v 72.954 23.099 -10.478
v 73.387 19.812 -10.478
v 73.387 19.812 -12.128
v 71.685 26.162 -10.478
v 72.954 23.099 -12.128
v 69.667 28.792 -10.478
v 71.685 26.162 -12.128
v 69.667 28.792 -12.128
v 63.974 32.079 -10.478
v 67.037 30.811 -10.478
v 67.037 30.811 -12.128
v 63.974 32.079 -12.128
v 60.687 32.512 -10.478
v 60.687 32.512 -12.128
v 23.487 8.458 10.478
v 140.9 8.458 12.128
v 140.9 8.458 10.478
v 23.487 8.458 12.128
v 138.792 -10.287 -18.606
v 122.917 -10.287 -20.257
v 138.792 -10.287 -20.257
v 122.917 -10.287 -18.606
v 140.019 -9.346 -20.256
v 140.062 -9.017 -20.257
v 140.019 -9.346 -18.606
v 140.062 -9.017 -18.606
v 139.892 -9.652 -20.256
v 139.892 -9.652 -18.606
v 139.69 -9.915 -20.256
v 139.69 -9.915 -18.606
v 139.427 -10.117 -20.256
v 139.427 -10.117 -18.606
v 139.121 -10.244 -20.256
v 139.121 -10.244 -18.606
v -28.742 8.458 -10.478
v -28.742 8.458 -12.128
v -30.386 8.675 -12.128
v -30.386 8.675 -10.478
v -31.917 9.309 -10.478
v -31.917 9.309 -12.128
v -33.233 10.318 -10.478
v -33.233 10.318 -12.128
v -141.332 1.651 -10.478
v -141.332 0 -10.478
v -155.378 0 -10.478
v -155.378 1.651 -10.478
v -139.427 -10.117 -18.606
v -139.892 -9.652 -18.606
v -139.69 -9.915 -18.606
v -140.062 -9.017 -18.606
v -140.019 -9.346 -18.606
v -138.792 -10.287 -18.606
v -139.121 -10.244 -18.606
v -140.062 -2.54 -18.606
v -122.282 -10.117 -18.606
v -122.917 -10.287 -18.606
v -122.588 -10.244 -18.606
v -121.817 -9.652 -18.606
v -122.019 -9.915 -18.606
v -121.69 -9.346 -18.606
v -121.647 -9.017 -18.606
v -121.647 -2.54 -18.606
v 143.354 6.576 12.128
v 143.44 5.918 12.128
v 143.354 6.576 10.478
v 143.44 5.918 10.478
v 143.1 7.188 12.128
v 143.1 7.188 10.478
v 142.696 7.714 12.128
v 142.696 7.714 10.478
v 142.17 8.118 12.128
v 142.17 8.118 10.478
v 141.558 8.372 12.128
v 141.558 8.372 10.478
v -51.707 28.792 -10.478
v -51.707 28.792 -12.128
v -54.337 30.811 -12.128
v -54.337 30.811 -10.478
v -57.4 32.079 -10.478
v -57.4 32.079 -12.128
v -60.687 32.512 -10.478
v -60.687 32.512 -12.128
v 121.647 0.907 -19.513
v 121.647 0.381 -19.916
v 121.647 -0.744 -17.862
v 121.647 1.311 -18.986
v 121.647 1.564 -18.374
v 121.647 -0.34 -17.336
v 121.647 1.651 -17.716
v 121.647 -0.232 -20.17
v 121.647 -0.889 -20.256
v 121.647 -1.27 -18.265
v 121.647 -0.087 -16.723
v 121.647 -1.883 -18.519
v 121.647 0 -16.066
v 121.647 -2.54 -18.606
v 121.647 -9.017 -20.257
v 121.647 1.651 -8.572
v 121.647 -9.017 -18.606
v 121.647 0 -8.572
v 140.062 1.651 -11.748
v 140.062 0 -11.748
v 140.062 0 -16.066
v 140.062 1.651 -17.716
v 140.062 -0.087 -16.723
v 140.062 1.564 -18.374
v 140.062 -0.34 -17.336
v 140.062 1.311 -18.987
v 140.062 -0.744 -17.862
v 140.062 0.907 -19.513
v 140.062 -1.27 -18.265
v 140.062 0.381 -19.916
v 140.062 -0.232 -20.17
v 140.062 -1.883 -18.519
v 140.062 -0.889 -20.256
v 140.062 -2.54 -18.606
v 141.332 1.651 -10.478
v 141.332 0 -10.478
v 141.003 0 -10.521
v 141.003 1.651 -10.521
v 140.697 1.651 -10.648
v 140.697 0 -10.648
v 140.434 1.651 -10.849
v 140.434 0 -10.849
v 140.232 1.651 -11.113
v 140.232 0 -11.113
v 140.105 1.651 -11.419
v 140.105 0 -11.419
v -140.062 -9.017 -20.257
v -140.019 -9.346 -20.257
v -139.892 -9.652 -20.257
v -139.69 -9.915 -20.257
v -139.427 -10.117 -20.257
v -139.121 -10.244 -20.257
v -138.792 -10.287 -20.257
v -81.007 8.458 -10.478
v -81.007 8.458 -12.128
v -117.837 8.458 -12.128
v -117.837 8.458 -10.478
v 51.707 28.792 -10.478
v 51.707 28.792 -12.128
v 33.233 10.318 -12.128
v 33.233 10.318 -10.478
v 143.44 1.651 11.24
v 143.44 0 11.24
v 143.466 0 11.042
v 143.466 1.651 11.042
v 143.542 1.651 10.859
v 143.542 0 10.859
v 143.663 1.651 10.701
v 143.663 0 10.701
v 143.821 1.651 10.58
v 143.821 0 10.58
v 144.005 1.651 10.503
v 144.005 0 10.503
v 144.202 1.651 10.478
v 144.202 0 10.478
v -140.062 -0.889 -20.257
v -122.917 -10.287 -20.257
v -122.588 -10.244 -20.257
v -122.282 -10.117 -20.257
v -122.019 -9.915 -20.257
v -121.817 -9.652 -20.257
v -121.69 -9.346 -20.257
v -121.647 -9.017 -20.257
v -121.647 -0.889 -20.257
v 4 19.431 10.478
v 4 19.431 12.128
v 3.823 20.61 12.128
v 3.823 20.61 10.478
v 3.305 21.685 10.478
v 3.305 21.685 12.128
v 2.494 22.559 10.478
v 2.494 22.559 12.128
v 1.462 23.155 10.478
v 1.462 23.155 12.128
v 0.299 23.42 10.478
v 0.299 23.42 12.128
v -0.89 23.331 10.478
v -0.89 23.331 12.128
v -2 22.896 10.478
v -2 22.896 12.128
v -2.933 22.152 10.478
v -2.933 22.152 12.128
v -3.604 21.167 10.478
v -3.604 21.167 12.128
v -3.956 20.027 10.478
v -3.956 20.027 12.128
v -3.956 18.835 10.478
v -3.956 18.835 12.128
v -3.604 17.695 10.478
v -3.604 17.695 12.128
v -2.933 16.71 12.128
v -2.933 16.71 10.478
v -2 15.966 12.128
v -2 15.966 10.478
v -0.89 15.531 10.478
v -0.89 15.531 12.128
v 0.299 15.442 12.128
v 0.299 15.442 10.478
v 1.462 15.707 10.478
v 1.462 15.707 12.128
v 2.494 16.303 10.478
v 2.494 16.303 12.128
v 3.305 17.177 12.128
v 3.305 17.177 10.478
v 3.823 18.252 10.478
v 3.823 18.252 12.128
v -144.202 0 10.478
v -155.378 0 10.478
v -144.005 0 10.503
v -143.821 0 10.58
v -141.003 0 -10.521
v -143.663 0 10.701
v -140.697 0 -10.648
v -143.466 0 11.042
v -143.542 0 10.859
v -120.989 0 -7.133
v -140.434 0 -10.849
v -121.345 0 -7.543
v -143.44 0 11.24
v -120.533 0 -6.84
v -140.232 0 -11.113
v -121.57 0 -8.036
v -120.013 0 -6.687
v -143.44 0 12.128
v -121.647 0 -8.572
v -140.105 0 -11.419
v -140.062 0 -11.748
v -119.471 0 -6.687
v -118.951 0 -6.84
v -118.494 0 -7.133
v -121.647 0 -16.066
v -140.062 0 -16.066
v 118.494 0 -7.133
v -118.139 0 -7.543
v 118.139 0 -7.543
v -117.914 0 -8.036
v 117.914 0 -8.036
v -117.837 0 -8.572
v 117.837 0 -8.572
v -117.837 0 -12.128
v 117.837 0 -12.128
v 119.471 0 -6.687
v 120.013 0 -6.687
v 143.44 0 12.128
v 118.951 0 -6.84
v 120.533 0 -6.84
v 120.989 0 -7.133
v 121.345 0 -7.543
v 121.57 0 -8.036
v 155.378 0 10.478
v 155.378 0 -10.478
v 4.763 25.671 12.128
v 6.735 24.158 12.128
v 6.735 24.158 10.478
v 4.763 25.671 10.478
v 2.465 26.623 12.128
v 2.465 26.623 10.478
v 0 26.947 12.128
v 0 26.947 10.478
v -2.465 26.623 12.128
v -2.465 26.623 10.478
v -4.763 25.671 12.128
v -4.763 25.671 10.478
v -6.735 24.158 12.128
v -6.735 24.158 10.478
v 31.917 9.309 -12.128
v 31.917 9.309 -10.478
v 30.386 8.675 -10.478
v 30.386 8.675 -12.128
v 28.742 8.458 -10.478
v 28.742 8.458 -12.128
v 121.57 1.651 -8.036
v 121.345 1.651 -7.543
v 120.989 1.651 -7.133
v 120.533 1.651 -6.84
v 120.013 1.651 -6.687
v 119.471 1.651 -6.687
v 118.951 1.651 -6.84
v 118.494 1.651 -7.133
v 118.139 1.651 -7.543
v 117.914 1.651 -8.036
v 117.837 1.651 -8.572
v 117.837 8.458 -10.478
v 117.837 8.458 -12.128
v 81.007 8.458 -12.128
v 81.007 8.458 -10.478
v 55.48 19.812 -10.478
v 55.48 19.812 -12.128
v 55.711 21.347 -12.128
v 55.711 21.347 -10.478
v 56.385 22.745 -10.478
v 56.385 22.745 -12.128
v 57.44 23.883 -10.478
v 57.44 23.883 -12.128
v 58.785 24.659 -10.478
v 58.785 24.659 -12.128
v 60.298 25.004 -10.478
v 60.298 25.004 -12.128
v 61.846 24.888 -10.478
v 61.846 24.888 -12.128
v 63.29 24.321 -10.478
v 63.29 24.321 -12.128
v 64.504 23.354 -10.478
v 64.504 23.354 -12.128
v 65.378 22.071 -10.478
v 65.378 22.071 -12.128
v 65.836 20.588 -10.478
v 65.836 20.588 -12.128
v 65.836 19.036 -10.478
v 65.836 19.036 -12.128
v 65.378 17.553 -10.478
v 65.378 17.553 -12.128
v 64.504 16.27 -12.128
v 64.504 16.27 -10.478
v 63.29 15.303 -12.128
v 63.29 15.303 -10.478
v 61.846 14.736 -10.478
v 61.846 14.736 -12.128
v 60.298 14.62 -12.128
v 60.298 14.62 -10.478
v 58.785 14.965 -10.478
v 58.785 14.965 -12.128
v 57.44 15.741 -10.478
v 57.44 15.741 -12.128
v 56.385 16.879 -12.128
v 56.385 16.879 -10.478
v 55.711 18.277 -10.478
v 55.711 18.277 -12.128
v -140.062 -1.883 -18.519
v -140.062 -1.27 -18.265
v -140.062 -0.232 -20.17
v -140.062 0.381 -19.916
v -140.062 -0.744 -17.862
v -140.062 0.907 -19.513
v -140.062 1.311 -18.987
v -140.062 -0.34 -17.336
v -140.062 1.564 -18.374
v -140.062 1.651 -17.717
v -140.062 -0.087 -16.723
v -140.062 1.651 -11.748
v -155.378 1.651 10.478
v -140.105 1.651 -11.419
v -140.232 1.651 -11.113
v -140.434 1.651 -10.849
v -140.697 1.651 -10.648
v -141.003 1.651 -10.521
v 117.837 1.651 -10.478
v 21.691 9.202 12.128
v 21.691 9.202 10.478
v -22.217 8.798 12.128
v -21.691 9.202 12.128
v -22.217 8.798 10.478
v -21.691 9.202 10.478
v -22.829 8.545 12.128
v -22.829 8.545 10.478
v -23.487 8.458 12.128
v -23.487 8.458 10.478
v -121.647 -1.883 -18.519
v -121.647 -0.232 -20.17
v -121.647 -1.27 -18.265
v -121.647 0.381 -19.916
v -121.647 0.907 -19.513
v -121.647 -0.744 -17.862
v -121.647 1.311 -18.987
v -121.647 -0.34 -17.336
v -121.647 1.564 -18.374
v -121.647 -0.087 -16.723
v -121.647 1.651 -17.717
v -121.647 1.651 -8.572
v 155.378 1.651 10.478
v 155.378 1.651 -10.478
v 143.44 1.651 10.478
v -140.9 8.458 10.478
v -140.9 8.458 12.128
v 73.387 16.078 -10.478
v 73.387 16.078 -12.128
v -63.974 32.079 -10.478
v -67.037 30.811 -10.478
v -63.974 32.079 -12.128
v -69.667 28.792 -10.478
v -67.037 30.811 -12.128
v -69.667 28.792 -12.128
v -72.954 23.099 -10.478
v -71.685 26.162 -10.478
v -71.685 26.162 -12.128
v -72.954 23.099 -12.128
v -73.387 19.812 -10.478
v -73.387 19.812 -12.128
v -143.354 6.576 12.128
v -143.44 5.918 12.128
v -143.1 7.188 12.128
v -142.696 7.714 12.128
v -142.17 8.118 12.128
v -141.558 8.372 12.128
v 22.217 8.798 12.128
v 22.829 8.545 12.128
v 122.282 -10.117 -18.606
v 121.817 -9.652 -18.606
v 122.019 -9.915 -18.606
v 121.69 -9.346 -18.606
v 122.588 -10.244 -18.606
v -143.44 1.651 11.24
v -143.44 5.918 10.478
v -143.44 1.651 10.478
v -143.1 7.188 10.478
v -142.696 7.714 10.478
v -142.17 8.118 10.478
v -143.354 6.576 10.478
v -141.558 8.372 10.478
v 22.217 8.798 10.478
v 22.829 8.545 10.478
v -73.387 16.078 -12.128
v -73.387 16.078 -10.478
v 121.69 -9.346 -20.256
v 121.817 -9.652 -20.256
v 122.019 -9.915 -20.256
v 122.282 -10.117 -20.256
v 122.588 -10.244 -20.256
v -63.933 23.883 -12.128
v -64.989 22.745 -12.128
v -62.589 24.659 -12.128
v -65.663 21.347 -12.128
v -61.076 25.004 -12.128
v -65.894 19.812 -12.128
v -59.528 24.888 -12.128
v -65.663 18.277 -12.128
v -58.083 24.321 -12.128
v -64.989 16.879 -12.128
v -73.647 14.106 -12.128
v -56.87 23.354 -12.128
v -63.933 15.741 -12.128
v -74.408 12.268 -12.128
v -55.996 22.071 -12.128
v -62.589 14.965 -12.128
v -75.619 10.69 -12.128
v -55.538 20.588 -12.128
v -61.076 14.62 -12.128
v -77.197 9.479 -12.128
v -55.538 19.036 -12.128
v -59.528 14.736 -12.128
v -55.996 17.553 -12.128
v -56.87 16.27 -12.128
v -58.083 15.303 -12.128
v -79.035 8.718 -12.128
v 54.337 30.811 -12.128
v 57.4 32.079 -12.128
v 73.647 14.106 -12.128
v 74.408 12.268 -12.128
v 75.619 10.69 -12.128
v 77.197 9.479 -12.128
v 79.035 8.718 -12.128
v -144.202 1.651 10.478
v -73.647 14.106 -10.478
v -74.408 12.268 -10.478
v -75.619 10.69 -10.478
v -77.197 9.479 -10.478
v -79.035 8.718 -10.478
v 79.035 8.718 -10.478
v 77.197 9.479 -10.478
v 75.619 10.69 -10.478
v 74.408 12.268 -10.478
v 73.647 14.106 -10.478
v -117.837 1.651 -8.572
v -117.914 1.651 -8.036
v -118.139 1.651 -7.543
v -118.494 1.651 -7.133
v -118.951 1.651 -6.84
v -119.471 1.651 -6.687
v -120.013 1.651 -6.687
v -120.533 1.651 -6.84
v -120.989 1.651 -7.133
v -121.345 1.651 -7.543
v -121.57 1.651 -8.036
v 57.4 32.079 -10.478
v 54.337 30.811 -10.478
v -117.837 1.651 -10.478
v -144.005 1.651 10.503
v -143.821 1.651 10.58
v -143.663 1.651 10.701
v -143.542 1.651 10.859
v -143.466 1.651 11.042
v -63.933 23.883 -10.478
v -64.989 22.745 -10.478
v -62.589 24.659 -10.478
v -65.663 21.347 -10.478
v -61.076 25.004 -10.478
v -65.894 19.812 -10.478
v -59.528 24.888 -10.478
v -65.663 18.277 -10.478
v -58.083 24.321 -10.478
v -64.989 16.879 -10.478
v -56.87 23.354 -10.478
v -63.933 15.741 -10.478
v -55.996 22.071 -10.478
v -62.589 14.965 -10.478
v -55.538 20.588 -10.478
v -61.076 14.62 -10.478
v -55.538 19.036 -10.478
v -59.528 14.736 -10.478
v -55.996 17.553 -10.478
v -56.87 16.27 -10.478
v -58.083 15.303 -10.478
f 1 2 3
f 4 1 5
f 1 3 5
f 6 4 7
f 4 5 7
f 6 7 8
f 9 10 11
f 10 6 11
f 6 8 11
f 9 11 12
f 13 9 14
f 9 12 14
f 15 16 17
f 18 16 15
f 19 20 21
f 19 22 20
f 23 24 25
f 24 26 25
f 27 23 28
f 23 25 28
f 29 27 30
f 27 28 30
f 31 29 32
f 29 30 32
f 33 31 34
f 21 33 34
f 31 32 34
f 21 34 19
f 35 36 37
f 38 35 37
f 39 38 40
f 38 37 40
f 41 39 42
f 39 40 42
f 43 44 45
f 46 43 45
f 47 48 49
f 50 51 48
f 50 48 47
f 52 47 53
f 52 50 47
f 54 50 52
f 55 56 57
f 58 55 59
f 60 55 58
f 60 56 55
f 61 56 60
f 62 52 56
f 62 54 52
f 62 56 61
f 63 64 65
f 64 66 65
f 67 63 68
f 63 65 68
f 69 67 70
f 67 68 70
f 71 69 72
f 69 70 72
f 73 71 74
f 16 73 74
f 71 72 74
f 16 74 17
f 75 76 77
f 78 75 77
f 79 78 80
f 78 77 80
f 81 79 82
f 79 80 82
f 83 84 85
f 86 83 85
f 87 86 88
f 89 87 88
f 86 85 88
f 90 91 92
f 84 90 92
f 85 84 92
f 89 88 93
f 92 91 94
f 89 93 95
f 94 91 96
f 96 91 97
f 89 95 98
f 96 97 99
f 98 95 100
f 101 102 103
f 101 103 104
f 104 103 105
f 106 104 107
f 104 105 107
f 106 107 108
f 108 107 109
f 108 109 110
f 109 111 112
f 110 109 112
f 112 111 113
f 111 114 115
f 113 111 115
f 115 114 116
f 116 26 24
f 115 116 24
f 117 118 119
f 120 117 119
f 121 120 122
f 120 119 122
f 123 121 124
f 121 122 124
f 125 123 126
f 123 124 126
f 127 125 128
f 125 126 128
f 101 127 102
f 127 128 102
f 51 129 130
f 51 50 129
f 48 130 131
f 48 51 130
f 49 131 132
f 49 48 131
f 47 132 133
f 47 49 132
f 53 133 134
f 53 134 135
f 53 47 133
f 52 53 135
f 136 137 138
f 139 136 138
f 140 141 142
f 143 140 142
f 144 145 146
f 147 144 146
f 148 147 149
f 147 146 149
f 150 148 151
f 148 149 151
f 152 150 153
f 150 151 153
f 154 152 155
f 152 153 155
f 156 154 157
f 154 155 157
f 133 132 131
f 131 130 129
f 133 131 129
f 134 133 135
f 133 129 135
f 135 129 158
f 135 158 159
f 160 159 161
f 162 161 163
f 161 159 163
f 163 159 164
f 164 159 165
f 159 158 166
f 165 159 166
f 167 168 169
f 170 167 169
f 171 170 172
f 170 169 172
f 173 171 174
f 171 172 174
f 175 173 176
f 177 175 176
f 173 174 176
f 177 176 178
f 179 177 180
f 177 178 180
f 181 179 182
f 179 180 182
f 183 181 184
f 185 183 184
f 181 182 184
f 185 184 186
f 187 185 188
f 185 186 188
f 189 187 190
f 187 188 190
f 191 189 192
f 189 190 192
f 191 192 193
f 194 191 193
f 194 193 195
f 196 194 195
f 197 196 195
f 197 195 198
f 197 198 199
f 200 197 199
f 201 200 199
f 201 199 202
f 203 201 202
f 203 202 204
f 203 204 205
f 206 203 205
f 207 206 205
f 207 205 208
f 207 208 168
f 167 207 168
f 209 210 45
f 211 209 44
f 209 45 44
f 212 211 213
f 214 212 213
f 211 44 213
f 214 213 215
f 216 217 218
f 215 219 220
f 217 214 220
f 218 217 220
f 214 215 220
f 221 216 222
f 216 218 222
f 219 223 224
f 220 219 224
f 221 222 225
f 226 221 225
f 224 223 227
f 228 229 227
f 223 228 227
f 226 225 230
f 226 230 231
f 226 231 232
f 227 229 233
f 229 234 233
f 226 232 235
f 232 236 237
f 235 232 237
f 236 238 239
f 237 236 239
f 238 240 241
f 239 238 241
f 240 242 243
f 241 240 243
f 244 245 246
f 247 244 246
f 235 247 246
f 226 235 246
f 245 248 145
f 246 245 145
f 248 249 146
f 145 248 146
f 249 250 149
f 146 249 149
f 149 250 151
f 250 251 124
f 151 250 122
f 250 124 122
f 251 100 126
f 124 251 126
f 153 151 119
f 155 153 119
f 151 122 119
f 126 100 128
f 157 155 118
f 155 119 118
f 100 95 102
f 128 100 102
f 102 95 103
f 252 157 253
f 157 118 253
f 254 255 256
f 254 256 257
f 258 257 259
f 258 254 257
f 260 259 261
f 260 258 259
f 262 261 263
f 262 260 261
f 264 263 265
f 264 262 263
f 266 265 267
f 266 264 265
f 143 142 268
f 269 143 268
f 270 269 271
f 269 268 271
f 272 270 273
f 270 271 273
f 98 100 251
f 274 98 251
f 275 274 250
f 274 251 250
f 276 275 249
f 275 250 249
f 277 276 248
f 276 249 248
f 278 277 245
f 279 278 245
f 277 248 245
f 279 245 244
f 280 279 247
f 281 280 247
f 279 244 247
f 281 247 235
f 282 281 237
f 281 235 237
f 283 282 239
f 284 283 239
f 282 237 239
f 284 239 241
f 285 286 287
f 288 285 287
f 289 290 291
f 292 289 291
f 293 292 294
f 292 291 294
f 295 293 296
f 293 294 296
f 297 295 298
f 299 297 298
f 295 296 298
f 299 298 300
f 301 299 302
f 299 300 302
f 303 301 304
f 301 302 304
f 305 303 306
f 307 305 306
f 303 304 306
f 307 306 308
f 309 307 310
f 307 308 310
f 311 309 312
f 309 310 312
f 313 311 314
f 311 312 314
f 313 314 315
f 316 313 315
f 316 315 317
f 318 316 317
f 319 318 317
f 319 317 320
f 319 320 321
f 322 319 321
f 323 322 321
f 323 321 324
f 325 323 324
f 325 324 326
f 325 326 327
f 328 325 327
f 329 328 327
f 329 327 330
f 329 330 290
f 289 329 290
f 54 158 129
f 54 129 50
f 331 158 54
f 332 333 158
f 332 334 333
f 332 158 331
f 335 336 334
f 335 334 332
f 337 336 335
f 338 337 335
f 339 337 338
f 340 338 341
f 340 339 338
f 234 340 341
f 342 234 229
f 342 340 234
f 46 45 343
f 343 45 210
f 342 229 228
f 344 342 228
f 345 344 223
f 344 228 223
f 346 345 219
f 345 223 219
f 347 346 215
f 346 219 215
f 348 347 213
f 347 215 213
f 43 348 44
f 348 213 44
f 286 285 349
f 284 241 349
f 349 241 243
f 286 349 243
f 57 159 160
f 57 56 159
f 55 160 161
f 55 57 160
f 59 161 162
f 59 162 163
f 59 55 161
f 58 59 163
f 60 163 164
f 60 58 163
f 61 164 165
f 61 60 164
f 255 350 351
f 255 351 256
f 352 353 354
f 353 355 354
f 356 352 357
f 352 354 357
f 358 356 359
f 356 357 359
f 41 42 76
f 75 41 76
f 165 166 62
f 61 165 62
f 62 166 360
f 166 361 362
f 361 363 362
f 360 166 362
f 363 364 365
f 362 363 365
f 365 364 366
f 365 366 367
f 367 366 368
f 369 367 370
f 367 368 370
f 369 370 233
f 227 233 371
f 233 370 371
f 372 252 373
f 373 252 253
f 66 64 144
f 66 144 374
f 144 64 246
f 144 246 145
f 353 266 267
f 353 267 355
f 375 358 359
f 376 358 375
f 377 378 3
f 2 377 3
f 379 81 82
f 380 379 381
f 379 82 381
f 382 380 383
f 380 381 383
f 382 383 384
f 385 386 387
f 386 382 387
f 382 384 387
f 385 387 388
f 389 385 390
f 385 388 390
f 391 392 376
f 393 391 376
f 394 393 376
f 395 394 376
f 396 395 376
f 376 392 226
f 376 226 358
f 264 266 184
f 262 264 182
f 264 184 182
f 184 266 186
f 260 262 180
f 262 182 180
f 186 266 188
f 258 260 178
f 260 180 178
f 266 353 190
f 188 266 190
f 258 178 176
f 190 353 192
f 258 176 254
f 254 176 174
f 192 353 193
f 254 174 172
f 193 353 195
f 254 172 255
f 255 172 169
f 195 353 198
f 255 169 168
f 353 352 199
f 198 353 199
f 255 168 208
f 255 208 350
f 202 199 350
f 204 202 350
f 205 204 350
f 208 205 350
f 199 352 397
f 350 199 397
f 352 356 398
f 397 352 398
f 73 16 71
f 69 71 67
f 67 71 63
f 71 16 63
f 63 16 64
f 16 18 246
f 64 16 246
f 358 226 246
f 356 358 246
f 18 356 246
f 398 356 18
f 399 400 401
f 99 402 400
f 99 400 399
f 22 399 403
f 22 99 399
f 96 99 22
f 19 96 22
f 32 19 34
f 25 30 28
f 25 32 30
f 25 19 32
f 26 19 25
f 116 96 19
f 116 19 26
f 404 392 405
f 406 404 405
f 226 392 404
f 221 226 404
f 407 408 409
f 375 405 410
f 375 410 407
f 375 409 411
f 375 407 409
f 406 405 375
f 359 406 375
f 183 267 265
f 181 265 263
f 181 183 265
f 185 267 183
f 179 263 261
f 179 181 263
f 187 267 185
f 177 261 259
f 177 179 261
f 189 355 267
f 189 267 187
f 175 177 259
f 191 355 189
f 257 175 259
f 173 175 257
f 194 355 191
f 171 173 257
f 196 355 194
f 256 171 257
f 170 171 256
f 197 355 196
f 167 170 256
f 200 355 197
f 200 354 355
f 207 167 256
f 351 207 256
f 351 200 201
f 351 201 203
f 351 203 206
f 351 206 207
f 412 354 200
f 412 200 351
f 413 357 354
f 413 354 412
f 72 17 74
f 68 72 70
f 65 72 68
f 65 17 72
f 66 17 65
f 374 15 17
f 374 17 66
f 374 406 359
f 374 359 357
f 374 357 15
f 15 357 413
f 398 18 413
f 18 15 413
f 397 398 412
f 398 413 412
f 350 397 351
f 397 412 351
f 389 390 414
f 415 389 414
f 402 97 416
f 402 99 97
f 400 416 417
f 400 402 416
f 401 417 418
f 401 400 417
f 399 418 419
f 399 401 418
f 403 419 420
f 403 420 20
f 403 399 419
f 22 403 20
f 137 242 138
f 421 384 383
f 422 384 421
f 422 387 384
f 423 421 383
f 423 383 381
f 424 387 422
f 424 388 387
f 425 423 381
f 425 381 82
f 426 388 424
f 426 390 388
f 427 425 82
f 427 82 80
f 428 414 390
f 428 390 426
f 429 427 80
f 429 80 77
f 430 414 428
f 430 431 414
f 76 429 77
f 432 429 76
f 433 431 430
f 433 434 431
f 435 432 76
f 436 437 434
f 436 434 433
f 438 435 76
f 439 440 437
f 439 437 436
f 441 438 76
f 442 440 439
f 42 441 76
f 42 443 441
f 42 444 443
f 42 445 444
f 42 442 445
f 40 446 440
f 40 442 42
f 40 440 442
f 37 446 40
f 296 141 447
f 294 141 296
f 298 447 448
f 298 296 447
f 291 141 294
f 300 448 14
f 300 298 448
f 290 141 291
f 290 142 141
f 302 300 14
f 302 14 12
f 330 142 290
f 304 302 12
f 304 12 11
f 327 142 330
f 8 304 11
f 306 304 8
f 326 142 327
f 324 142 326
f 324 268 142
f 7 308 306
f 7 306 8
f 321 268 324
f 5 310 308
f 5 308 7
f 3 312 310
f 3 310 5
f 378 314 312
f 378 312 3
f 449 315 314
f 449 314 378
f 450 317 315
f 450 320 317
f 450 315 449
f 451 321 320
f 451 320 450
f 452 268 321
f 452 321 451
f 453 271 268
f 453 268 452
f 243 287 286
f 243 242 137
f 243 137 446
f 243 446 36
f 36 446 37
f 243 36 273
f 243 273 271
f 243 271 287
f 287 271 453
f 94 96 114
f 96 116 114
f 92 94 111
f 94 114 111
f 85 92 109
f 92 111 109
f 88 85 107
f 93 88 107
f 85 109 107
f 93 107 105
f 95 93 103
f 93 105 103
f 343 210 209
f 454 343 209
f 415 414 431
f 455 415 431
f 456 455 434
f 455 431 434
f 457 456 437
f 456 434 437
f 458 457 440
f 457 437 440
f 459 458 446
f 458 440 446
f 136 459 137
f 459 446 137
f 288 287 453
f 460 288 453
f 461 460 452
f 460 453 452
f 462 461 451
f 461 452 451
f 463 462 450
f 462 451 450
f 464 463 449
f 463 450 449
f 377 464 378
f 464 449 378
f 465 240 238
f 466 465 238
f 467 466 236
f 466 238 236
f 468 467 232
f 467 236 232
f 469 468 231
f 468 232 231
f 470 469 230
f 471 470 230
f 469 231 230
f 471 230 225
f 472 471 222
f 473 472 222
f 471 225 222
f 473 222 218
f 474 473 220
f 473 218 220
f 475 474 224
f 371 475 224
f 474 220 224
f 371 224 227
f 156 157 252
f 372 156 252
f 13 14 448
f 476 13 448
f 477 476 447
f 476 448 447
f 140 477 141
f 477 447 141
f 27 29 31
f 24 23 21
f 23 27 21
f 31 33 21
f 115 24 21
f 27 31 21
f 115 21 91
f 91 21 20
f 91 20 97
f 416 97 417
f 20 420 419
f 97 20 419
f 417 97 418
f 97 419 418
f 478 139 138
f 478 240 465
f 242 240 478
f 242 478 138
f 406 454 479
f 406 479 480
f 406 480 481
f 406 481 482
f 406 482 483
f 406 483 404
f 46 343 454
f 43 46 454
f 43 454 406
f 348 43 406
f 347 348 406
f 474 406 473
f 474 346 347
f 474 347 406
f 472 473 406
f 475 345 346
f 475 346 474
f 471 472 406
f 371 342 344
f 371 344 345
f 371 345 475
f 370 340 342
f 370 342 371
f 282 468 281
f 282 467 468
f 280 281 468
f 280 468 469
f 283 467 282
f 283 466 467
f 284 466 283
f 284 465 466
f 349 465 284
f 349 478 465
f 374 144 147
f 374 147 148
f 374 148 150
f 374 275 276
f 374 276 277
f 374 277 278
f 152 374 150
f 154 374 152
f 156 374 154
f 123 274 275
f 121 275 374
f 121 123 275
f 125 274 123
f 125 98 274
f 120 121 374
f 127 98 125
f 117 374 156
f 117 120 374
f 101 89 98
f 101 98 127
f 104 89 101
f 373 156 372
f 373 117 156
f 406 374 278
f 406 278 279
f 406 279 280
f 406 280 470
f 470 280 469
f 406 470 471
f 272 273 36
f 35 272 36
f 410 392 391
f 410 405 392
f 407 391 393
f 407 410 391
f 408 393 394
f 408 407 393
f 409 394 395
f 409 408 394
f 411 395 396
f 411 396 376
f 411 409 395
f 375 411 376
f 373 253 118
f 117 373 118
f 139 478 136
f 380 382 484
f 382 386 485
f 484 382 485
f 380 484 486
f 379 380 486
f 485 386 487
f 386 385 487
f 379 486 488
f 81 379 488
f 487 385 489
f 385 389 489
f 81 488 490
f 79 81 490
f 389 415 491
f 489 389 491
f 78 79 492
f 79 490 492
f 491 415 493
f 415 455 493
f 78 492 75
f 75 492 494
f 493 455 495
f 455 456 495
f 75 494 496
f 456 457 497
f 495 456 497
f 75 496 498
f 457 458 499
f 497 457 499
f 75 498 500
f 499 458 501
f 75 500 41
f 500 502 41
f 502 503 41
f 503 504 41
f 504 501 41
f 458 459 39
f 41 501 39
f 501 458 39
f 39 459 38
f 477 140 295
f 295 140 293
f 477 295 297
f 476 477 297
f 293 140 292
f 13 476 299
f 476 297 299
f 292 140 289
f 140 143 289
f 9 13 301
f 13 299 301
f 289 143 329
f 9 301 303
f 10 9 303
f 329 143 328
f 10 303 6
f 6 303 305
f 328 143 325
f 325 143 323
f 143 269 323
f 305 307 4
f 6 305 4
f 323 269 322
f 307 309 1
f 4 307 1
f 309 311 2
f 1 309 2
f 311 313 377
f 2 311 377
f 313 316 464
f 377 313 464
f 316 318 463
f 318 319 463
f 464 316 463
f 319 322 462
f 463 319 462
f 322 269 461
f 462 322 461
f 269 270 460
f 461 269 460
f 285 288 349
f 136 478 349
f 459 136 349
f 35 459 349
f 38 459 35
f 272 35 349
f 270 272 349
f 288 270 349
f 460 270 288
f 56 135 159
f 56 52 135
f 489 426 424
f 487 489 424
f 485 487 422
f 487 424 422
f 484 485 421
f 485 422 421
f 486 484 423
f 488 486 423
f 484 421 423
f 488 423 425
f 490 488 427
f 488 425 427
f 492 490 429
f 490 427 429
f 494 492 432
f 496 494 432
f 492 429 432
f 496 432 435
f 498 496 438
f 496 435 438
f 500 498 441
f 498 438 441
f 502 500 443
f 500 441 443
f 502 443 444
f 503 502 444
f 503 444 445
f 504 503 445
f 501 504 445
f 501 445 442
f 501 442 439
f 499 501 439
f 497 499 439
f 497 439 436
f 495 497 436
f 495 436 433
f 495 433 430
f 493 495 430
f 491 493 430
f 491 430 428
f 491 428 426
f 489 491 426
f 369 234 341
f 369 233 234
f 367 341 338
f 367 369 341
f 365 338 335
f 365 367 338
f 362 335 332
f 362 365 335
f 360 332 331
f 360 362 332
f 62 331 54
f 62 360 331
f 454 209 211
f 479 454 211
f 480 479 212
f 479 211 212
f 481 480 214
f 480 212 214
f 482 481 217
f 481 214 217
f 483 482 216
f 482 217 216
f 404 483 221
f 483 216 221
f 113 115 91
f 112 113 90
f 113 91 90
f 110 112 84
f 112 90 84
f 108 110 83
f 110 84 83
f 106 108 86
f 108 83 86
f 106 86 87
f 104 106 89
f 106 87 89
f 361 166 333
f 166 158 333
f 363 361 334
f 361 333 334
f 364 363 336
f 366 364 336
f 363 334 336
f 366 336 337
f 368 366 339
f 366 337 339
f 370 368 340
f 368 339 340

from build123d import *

# Parameters (mm, degrees)
BOSS_EXTRUDE1_DEPTH = 1.651
SKETCH2_W           = 18.415
SKETCH2_H           = 1.651
BOSS_EXTRUDE2_DEPTH = 10.287
FILLET1_R           = 2.54
FILLET3_R           = 1.27
SKETCH4_W           = 235.6739
SKETCH4_H           = 1.651
SKETCH4_W_2         = 286.8803
BOSS_EXTRUDE3_DEPTH = 30.861
SKETCH5_R           = 4.0005
CUT_EXTRUDE2_DEPTH  = 2.54
FILLET4_R           = 2.54
SKETCH11_R          = 5.207
CUT_EXTRUDE3_DEPTH  = 7.62


with BuildPart() as part:
    # Sketch1 → Boss-Extrude1 (new body)
    with BuildSketch(Plane(origin=(0, 0, 0), x_dir=(1, 0, 0), z_dir=(0, 1, 0))):
        with BuildLine():
            Line((117.83695, 8.5725), (117.83695, 12.1285))
            Line((117.83695, 12.1285), (117.186124302, 12.1285))
            Line((117.186124302, 12.1285), (-117.186124302, 12.1285))
            Line((-117.186124302, 12.1285), (-117.83695, 12.1285))
            Line((-117.83695, 12.1285), (-117.83695, 8.5725))
            ThreePointArc((-117.83695, 8.5725), (-119.74195, 6.6675), (-121.64695, 8.5725))
            Line((-121.64695, 8.5725), (-121.64695, 12.1285))
            Line((-121.64695, 12.1285), (-121.64695, 20.2565))
            Line((-121.64695, 20.2565), (-140.06195, 20.2565))
            Line((-140.06195, 20.2565), (-140.06195, 12.1285))
            Line((-140.06195, 12.1285), (-140.06195, 11.7475))
            ThreePointArc((-140.06195, 11.7475), (-140.433924388, 10.849474388), (-141.33195, 10.4775))
            Line((-141.33195, 10.4775), (-143.44015, 10.4775))
            Line((-143.44015, 10.4775), (-155.37815, 10.4775))
            Line((-155.37815, 10.4775), (-155.37815, -10.4775))
            Line((-155.37815, -10.4775), (-144.20215, -10.4775))
            ThreePointArc((-144.20215, -10.4775), (-143.663334633, -10.700684633), (-143.44015, -11.2395))
            Line((-143.44015, -11.2395), (-143.44015, -12.1285))
            Line((-143.44015, -12.1285), (143.44015, -12.1285))
            Line((143.44015, -12.1285), (143.44015, -11.2395))
            ThreePointArc((143.44015, -11.2395), (143.663334633, -10.700684633), (144.20215, -10.4775))
            Line((144.20215, -10.4775), (155.37815, -10.4775))
            Line((155.37815, -10.4775), (155.37815, 10.4775))
            Line((155.37815, 10.4775), (143.44015, 10.4775))
            Line((143.44015, 10.4775), (141.33195, 10.4775))
            ThreePointArc((141.33195, 10.4775), (140.433924388, 10.849474388), (140.06195, 11.7475))
            Line((140.06195, 11.7475), (140.06195, 12.1285))
            Line((140.06195, 12.1285), (140.06195, 20.2565))
            Line((140.06195, 20.2565), (121.64695, 20.2565))
            Line((121.64695, 20.2565), (121.64695, 12.1285))
            Line((121.64695, 12.1285), (121.64695, 8.5725))
            ThreePointArc((121.64695, 8.5725), (119.74195, 6.6675), (117.83695, 8.5725))
        make_face()
    extrude(amount=BOSS_EXTRUDE1_DEPTH)

    # Sketch2 → Boss-Extrude2 (add)
    with BuildSketch(Plane.XZ):
        with Locations((-130.85445, -19.431)):
            Rectangle(SKETCH2_W, SKETCH2_H)
        with Locations((130.85445, -19.431)):
            Rectangle(SKETCH2_W, SKETCH2_H)
    extrude(amount=BOSS_EXTRUDE2_DEPTH)

    # Fillet1
    fillet1_edges = [part.edges().sort_by_distance(p)[0] for p in [
        (130.85445, 1.651, -20.2565),
        (-130.85445, 1.651, -20.2565),
        (-130.85445, 0, -18.6055),
        (130.85445, 0, -18.6055),
    ]]
    fillet(fillet1_edges, radius=FILLET1_R)

    # Fillet3
    fillet3_edges = [part.edges().sort_by_distance(p)[0] for p in [
        (-140.06195, -10.287, -19.431),
        (-121.64695, -10.287, -19.431),
        (140.06195, -10.287, -19.431),
        (121.64695, -10.287, -19.431),
    ]]
    fillet(fillet3_edges, radius=FILLET3_R)

    # Sketch4 → Boss-Extrude3 (add)
    with BuildSketch(Plane(origin=(0, 1.651, 0), x_dir=(1, 0, 0), z_dir=(0, 1, 0))):
        with Locations((0, 11.303)):
            Rectangle(SKETCH4_W, SKETCH4_H)
        with Locations((0, -11.303)):
            Rectangle(SKETCH4_W_2, SKETCH4_H)
    extrude(amount=BOSS_EXTRUDE3_DEPTH)

    # Sketch5 → Cut-Extrude2 (cut)
    with BuildSketch(Plane.XY.offset(12.1285)):
        with Locations((0, 19.431)):
            Circle(SKETCH5_R)
        with BuildLine():
            Line((143.44015, 8.4582), (22.43455, 8.4582))
            Line((22.43455, 8.4582), (6.735192091, 24.157557909))
            ThreePointArc((6.735192091, 24.157557909), (0, 26.947365818), (-6.735192091, 24.157557909))
            Line((-6.735192091, 24.157557909), (-22.43455, 8.4582))
            Line((-22.43455, 8.4582), (-143.44015, 8.4582))
            Line((-143.44015, 8.4582), (-143.44015, 32.512))
            Line((-143.44015, 32.512), (143.44015, 32.512))
            Line((143.44015, 32.512), (143.44015, 8.4582))
        make_face()
    extrude(amount=-CUT_EXTRUDE2_DEPTH, mode=Mode.SUBTRACT)

    # Fillet4
    fillet4_edges = [part.edges().sort_by_distance(p)[0] for p in [
        (143.44015, 8.4582, 11.303),
        (22.43455, 8.4582, 11.303),
        (-22.43455, 8.4582, 11.303),
        (-143.44015, 8.4582, 11.303),
    ]]
    fillet(fillet4_edges, radius=FILLET4_R)

    # Sketch11 → Cut-Extrude3 (cut)
    with BuildSketch(Plane(origin=(0, 0, -12.1285), x_dir=(-1, 0, 0), z_dir=(0, 0, -1))):
        with Locations((60.68695, 19.812)):
            Circle(SKETCH11_R)
        with Locations((-60.68695, 19.812)):
            Circle(SKETCH11_R)
        with BuildLine():
            Line((81.00695, 8.4582), (117.83695, 8.4582))
            Line((117.83695, 8.4582), (117.83695, 32.512))
            Line((117.83695, 32.512), (60.68695, 32.512))
            ThreePointArc((60.68695, 32.512), (69.667206121, 28.792256121), (73.38695, 19.812))
            Line((73.38695, 19.812), (73.38695, 16.0782))
            ThreePointArc((73.38695, 16.0782), (75.618796327, 10.690046327), (81.00695, 8.4582))
        make_face()
        with BuildLine():
            Line((-28.742381637, 8.4582), (0, 8.4582))
            Line((0, 8.4582), (28.742381637, 8.4582))
            ThreePointArc((28.742381637, 8.4582), (31.172421432, 8.941564969), (33.232509697, 10.318071939))
            Line((33.232509697, 10.318071939), (51.706693879, 28.792256121))
            ThreePointArc((51.706693879, 28.792256121), (55.826870409, 31.545270063), (60.68695, 32.512))
            Line((60.68695, 32.512), (-60.68695, 32.512))
            ThreePointArc((-60.68695, 32.512), (-55.826870409, 31.545270063), (-51.706693879, 28.792256121))
            Line((-51.706693879, 28.792256121), (-33.232509697, 10.318071939))
            ThreePointArc((-33.232509697, 10.318071939), (-31.172421432, 8.941564969), (-28.742381637, 8.4582))
        make_face()
        with BuildLine():
            Line((-117.83695, 32.512), (-117.83695, 8.4582))
            Line((-117.83695, 8.4582), (-81.00695, 8.4582))
            ThreePointArc((-81.00695, 8.4582), (-75.618796327, 10.690046327), (-73.38695, 16.0782))
            Line((-73.38695, 16.0782), (-73.38695, 19.812))
            ThreePointArc((-73.38695, 19.812), (-69.667206121, 28.792256121), (-60.68695, 32.512))
            Line((-60.68695, 32.512), (-117.83695, 32.512))
        make_face()
    extrude(amount=-CUT_EXTRUDE3_DEPTH, mode=Mode.SUBTRACT)


solid = part.part
